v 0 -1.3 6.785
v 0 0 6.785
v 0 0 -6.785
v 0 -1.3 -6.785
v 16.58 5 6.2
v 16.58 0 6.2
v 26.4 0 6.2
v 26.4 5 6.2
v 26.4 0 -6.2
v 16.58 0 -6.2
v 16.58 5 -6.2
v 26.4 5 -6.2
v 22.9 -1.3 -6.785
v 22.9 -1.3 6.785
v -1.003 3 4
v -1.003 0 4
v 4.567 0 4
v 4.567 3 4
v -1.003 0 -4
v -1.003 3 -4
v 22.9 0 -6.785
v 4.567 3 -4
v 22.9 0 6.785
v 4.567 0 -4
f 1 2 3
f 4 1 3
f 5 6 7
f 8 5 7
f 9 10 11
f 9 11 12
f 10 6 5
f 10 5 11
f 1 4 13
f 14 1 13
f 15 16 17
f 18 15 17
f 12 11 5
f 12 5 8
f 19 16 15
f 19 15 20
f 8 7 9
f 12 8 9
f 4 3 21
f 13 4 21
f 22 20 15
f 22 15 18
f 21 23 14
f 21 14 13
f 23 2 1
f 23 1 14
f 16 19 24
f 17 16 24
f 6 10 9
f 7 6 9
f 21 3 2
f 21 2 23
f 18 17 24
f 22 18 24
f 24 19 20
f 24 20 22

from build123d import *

# Parameters (mm, degrees)
SKETCH1_W           = 22.9
SKETCH1_H           = 13.57
BOSS_EXTRUDE1_DEPTH = 1.3
SKETCH1_3_W         = 9.82
SKETCH1_3_H         = 12.4
BOSS_EXTRUDE2_DEPTH = 5
SKETCH1_4_W         = 5.57
SKETCH1_4_H         = 8
BOSS_EXTRUDE3_DEPTH = 3


with BuildPart() as part:
    # Sketch1 → Boss-Extrude1 (new body)
    with BuildSketch(Plane(origin=(0, 0, 0), x_dir=(1, 0, 0), z_dir=(0, 1, 0))):
        with Locations((11.45, 0)):
            Rectangle(SKETCH1_W, SKETCH1_H)
    extrude(amount=-BOSS_EXTRUDE1_DEPTH)


with BuildPart() as body_2:
    # Sketch1<3> → Boss-Extrude2 (new body)
    with BuildSketch(Plane(origin=(0, 0, 0), x_dir=(1, 0, 0), z_dir=(0, 1, 0))):
        with Locations((21.49, 0)):
            Rectangle(SKETCH1_3_W, SKETCH1_3_H)
    extrude(amount=BOSS_EXTRUDE2_DEPTH)


with BuildPart() as body_3:
    # Sketch1<4> → Boss-Extrude3 (new body)
    with BuildSketch(Plane(origin=(0, 0, 0), x_dir=(1, 0, 0), z_dir=(0, 1, 0))):
        with Locations((1.78159017, 0)):
            Rectangle(SKETCH1_4_W, SKETCH1_4_H)
    extrude(amount=BOSS_EXTRUDE3_DEPTH)


solid = Compound([part.part, body_2.part, body_3.part])
